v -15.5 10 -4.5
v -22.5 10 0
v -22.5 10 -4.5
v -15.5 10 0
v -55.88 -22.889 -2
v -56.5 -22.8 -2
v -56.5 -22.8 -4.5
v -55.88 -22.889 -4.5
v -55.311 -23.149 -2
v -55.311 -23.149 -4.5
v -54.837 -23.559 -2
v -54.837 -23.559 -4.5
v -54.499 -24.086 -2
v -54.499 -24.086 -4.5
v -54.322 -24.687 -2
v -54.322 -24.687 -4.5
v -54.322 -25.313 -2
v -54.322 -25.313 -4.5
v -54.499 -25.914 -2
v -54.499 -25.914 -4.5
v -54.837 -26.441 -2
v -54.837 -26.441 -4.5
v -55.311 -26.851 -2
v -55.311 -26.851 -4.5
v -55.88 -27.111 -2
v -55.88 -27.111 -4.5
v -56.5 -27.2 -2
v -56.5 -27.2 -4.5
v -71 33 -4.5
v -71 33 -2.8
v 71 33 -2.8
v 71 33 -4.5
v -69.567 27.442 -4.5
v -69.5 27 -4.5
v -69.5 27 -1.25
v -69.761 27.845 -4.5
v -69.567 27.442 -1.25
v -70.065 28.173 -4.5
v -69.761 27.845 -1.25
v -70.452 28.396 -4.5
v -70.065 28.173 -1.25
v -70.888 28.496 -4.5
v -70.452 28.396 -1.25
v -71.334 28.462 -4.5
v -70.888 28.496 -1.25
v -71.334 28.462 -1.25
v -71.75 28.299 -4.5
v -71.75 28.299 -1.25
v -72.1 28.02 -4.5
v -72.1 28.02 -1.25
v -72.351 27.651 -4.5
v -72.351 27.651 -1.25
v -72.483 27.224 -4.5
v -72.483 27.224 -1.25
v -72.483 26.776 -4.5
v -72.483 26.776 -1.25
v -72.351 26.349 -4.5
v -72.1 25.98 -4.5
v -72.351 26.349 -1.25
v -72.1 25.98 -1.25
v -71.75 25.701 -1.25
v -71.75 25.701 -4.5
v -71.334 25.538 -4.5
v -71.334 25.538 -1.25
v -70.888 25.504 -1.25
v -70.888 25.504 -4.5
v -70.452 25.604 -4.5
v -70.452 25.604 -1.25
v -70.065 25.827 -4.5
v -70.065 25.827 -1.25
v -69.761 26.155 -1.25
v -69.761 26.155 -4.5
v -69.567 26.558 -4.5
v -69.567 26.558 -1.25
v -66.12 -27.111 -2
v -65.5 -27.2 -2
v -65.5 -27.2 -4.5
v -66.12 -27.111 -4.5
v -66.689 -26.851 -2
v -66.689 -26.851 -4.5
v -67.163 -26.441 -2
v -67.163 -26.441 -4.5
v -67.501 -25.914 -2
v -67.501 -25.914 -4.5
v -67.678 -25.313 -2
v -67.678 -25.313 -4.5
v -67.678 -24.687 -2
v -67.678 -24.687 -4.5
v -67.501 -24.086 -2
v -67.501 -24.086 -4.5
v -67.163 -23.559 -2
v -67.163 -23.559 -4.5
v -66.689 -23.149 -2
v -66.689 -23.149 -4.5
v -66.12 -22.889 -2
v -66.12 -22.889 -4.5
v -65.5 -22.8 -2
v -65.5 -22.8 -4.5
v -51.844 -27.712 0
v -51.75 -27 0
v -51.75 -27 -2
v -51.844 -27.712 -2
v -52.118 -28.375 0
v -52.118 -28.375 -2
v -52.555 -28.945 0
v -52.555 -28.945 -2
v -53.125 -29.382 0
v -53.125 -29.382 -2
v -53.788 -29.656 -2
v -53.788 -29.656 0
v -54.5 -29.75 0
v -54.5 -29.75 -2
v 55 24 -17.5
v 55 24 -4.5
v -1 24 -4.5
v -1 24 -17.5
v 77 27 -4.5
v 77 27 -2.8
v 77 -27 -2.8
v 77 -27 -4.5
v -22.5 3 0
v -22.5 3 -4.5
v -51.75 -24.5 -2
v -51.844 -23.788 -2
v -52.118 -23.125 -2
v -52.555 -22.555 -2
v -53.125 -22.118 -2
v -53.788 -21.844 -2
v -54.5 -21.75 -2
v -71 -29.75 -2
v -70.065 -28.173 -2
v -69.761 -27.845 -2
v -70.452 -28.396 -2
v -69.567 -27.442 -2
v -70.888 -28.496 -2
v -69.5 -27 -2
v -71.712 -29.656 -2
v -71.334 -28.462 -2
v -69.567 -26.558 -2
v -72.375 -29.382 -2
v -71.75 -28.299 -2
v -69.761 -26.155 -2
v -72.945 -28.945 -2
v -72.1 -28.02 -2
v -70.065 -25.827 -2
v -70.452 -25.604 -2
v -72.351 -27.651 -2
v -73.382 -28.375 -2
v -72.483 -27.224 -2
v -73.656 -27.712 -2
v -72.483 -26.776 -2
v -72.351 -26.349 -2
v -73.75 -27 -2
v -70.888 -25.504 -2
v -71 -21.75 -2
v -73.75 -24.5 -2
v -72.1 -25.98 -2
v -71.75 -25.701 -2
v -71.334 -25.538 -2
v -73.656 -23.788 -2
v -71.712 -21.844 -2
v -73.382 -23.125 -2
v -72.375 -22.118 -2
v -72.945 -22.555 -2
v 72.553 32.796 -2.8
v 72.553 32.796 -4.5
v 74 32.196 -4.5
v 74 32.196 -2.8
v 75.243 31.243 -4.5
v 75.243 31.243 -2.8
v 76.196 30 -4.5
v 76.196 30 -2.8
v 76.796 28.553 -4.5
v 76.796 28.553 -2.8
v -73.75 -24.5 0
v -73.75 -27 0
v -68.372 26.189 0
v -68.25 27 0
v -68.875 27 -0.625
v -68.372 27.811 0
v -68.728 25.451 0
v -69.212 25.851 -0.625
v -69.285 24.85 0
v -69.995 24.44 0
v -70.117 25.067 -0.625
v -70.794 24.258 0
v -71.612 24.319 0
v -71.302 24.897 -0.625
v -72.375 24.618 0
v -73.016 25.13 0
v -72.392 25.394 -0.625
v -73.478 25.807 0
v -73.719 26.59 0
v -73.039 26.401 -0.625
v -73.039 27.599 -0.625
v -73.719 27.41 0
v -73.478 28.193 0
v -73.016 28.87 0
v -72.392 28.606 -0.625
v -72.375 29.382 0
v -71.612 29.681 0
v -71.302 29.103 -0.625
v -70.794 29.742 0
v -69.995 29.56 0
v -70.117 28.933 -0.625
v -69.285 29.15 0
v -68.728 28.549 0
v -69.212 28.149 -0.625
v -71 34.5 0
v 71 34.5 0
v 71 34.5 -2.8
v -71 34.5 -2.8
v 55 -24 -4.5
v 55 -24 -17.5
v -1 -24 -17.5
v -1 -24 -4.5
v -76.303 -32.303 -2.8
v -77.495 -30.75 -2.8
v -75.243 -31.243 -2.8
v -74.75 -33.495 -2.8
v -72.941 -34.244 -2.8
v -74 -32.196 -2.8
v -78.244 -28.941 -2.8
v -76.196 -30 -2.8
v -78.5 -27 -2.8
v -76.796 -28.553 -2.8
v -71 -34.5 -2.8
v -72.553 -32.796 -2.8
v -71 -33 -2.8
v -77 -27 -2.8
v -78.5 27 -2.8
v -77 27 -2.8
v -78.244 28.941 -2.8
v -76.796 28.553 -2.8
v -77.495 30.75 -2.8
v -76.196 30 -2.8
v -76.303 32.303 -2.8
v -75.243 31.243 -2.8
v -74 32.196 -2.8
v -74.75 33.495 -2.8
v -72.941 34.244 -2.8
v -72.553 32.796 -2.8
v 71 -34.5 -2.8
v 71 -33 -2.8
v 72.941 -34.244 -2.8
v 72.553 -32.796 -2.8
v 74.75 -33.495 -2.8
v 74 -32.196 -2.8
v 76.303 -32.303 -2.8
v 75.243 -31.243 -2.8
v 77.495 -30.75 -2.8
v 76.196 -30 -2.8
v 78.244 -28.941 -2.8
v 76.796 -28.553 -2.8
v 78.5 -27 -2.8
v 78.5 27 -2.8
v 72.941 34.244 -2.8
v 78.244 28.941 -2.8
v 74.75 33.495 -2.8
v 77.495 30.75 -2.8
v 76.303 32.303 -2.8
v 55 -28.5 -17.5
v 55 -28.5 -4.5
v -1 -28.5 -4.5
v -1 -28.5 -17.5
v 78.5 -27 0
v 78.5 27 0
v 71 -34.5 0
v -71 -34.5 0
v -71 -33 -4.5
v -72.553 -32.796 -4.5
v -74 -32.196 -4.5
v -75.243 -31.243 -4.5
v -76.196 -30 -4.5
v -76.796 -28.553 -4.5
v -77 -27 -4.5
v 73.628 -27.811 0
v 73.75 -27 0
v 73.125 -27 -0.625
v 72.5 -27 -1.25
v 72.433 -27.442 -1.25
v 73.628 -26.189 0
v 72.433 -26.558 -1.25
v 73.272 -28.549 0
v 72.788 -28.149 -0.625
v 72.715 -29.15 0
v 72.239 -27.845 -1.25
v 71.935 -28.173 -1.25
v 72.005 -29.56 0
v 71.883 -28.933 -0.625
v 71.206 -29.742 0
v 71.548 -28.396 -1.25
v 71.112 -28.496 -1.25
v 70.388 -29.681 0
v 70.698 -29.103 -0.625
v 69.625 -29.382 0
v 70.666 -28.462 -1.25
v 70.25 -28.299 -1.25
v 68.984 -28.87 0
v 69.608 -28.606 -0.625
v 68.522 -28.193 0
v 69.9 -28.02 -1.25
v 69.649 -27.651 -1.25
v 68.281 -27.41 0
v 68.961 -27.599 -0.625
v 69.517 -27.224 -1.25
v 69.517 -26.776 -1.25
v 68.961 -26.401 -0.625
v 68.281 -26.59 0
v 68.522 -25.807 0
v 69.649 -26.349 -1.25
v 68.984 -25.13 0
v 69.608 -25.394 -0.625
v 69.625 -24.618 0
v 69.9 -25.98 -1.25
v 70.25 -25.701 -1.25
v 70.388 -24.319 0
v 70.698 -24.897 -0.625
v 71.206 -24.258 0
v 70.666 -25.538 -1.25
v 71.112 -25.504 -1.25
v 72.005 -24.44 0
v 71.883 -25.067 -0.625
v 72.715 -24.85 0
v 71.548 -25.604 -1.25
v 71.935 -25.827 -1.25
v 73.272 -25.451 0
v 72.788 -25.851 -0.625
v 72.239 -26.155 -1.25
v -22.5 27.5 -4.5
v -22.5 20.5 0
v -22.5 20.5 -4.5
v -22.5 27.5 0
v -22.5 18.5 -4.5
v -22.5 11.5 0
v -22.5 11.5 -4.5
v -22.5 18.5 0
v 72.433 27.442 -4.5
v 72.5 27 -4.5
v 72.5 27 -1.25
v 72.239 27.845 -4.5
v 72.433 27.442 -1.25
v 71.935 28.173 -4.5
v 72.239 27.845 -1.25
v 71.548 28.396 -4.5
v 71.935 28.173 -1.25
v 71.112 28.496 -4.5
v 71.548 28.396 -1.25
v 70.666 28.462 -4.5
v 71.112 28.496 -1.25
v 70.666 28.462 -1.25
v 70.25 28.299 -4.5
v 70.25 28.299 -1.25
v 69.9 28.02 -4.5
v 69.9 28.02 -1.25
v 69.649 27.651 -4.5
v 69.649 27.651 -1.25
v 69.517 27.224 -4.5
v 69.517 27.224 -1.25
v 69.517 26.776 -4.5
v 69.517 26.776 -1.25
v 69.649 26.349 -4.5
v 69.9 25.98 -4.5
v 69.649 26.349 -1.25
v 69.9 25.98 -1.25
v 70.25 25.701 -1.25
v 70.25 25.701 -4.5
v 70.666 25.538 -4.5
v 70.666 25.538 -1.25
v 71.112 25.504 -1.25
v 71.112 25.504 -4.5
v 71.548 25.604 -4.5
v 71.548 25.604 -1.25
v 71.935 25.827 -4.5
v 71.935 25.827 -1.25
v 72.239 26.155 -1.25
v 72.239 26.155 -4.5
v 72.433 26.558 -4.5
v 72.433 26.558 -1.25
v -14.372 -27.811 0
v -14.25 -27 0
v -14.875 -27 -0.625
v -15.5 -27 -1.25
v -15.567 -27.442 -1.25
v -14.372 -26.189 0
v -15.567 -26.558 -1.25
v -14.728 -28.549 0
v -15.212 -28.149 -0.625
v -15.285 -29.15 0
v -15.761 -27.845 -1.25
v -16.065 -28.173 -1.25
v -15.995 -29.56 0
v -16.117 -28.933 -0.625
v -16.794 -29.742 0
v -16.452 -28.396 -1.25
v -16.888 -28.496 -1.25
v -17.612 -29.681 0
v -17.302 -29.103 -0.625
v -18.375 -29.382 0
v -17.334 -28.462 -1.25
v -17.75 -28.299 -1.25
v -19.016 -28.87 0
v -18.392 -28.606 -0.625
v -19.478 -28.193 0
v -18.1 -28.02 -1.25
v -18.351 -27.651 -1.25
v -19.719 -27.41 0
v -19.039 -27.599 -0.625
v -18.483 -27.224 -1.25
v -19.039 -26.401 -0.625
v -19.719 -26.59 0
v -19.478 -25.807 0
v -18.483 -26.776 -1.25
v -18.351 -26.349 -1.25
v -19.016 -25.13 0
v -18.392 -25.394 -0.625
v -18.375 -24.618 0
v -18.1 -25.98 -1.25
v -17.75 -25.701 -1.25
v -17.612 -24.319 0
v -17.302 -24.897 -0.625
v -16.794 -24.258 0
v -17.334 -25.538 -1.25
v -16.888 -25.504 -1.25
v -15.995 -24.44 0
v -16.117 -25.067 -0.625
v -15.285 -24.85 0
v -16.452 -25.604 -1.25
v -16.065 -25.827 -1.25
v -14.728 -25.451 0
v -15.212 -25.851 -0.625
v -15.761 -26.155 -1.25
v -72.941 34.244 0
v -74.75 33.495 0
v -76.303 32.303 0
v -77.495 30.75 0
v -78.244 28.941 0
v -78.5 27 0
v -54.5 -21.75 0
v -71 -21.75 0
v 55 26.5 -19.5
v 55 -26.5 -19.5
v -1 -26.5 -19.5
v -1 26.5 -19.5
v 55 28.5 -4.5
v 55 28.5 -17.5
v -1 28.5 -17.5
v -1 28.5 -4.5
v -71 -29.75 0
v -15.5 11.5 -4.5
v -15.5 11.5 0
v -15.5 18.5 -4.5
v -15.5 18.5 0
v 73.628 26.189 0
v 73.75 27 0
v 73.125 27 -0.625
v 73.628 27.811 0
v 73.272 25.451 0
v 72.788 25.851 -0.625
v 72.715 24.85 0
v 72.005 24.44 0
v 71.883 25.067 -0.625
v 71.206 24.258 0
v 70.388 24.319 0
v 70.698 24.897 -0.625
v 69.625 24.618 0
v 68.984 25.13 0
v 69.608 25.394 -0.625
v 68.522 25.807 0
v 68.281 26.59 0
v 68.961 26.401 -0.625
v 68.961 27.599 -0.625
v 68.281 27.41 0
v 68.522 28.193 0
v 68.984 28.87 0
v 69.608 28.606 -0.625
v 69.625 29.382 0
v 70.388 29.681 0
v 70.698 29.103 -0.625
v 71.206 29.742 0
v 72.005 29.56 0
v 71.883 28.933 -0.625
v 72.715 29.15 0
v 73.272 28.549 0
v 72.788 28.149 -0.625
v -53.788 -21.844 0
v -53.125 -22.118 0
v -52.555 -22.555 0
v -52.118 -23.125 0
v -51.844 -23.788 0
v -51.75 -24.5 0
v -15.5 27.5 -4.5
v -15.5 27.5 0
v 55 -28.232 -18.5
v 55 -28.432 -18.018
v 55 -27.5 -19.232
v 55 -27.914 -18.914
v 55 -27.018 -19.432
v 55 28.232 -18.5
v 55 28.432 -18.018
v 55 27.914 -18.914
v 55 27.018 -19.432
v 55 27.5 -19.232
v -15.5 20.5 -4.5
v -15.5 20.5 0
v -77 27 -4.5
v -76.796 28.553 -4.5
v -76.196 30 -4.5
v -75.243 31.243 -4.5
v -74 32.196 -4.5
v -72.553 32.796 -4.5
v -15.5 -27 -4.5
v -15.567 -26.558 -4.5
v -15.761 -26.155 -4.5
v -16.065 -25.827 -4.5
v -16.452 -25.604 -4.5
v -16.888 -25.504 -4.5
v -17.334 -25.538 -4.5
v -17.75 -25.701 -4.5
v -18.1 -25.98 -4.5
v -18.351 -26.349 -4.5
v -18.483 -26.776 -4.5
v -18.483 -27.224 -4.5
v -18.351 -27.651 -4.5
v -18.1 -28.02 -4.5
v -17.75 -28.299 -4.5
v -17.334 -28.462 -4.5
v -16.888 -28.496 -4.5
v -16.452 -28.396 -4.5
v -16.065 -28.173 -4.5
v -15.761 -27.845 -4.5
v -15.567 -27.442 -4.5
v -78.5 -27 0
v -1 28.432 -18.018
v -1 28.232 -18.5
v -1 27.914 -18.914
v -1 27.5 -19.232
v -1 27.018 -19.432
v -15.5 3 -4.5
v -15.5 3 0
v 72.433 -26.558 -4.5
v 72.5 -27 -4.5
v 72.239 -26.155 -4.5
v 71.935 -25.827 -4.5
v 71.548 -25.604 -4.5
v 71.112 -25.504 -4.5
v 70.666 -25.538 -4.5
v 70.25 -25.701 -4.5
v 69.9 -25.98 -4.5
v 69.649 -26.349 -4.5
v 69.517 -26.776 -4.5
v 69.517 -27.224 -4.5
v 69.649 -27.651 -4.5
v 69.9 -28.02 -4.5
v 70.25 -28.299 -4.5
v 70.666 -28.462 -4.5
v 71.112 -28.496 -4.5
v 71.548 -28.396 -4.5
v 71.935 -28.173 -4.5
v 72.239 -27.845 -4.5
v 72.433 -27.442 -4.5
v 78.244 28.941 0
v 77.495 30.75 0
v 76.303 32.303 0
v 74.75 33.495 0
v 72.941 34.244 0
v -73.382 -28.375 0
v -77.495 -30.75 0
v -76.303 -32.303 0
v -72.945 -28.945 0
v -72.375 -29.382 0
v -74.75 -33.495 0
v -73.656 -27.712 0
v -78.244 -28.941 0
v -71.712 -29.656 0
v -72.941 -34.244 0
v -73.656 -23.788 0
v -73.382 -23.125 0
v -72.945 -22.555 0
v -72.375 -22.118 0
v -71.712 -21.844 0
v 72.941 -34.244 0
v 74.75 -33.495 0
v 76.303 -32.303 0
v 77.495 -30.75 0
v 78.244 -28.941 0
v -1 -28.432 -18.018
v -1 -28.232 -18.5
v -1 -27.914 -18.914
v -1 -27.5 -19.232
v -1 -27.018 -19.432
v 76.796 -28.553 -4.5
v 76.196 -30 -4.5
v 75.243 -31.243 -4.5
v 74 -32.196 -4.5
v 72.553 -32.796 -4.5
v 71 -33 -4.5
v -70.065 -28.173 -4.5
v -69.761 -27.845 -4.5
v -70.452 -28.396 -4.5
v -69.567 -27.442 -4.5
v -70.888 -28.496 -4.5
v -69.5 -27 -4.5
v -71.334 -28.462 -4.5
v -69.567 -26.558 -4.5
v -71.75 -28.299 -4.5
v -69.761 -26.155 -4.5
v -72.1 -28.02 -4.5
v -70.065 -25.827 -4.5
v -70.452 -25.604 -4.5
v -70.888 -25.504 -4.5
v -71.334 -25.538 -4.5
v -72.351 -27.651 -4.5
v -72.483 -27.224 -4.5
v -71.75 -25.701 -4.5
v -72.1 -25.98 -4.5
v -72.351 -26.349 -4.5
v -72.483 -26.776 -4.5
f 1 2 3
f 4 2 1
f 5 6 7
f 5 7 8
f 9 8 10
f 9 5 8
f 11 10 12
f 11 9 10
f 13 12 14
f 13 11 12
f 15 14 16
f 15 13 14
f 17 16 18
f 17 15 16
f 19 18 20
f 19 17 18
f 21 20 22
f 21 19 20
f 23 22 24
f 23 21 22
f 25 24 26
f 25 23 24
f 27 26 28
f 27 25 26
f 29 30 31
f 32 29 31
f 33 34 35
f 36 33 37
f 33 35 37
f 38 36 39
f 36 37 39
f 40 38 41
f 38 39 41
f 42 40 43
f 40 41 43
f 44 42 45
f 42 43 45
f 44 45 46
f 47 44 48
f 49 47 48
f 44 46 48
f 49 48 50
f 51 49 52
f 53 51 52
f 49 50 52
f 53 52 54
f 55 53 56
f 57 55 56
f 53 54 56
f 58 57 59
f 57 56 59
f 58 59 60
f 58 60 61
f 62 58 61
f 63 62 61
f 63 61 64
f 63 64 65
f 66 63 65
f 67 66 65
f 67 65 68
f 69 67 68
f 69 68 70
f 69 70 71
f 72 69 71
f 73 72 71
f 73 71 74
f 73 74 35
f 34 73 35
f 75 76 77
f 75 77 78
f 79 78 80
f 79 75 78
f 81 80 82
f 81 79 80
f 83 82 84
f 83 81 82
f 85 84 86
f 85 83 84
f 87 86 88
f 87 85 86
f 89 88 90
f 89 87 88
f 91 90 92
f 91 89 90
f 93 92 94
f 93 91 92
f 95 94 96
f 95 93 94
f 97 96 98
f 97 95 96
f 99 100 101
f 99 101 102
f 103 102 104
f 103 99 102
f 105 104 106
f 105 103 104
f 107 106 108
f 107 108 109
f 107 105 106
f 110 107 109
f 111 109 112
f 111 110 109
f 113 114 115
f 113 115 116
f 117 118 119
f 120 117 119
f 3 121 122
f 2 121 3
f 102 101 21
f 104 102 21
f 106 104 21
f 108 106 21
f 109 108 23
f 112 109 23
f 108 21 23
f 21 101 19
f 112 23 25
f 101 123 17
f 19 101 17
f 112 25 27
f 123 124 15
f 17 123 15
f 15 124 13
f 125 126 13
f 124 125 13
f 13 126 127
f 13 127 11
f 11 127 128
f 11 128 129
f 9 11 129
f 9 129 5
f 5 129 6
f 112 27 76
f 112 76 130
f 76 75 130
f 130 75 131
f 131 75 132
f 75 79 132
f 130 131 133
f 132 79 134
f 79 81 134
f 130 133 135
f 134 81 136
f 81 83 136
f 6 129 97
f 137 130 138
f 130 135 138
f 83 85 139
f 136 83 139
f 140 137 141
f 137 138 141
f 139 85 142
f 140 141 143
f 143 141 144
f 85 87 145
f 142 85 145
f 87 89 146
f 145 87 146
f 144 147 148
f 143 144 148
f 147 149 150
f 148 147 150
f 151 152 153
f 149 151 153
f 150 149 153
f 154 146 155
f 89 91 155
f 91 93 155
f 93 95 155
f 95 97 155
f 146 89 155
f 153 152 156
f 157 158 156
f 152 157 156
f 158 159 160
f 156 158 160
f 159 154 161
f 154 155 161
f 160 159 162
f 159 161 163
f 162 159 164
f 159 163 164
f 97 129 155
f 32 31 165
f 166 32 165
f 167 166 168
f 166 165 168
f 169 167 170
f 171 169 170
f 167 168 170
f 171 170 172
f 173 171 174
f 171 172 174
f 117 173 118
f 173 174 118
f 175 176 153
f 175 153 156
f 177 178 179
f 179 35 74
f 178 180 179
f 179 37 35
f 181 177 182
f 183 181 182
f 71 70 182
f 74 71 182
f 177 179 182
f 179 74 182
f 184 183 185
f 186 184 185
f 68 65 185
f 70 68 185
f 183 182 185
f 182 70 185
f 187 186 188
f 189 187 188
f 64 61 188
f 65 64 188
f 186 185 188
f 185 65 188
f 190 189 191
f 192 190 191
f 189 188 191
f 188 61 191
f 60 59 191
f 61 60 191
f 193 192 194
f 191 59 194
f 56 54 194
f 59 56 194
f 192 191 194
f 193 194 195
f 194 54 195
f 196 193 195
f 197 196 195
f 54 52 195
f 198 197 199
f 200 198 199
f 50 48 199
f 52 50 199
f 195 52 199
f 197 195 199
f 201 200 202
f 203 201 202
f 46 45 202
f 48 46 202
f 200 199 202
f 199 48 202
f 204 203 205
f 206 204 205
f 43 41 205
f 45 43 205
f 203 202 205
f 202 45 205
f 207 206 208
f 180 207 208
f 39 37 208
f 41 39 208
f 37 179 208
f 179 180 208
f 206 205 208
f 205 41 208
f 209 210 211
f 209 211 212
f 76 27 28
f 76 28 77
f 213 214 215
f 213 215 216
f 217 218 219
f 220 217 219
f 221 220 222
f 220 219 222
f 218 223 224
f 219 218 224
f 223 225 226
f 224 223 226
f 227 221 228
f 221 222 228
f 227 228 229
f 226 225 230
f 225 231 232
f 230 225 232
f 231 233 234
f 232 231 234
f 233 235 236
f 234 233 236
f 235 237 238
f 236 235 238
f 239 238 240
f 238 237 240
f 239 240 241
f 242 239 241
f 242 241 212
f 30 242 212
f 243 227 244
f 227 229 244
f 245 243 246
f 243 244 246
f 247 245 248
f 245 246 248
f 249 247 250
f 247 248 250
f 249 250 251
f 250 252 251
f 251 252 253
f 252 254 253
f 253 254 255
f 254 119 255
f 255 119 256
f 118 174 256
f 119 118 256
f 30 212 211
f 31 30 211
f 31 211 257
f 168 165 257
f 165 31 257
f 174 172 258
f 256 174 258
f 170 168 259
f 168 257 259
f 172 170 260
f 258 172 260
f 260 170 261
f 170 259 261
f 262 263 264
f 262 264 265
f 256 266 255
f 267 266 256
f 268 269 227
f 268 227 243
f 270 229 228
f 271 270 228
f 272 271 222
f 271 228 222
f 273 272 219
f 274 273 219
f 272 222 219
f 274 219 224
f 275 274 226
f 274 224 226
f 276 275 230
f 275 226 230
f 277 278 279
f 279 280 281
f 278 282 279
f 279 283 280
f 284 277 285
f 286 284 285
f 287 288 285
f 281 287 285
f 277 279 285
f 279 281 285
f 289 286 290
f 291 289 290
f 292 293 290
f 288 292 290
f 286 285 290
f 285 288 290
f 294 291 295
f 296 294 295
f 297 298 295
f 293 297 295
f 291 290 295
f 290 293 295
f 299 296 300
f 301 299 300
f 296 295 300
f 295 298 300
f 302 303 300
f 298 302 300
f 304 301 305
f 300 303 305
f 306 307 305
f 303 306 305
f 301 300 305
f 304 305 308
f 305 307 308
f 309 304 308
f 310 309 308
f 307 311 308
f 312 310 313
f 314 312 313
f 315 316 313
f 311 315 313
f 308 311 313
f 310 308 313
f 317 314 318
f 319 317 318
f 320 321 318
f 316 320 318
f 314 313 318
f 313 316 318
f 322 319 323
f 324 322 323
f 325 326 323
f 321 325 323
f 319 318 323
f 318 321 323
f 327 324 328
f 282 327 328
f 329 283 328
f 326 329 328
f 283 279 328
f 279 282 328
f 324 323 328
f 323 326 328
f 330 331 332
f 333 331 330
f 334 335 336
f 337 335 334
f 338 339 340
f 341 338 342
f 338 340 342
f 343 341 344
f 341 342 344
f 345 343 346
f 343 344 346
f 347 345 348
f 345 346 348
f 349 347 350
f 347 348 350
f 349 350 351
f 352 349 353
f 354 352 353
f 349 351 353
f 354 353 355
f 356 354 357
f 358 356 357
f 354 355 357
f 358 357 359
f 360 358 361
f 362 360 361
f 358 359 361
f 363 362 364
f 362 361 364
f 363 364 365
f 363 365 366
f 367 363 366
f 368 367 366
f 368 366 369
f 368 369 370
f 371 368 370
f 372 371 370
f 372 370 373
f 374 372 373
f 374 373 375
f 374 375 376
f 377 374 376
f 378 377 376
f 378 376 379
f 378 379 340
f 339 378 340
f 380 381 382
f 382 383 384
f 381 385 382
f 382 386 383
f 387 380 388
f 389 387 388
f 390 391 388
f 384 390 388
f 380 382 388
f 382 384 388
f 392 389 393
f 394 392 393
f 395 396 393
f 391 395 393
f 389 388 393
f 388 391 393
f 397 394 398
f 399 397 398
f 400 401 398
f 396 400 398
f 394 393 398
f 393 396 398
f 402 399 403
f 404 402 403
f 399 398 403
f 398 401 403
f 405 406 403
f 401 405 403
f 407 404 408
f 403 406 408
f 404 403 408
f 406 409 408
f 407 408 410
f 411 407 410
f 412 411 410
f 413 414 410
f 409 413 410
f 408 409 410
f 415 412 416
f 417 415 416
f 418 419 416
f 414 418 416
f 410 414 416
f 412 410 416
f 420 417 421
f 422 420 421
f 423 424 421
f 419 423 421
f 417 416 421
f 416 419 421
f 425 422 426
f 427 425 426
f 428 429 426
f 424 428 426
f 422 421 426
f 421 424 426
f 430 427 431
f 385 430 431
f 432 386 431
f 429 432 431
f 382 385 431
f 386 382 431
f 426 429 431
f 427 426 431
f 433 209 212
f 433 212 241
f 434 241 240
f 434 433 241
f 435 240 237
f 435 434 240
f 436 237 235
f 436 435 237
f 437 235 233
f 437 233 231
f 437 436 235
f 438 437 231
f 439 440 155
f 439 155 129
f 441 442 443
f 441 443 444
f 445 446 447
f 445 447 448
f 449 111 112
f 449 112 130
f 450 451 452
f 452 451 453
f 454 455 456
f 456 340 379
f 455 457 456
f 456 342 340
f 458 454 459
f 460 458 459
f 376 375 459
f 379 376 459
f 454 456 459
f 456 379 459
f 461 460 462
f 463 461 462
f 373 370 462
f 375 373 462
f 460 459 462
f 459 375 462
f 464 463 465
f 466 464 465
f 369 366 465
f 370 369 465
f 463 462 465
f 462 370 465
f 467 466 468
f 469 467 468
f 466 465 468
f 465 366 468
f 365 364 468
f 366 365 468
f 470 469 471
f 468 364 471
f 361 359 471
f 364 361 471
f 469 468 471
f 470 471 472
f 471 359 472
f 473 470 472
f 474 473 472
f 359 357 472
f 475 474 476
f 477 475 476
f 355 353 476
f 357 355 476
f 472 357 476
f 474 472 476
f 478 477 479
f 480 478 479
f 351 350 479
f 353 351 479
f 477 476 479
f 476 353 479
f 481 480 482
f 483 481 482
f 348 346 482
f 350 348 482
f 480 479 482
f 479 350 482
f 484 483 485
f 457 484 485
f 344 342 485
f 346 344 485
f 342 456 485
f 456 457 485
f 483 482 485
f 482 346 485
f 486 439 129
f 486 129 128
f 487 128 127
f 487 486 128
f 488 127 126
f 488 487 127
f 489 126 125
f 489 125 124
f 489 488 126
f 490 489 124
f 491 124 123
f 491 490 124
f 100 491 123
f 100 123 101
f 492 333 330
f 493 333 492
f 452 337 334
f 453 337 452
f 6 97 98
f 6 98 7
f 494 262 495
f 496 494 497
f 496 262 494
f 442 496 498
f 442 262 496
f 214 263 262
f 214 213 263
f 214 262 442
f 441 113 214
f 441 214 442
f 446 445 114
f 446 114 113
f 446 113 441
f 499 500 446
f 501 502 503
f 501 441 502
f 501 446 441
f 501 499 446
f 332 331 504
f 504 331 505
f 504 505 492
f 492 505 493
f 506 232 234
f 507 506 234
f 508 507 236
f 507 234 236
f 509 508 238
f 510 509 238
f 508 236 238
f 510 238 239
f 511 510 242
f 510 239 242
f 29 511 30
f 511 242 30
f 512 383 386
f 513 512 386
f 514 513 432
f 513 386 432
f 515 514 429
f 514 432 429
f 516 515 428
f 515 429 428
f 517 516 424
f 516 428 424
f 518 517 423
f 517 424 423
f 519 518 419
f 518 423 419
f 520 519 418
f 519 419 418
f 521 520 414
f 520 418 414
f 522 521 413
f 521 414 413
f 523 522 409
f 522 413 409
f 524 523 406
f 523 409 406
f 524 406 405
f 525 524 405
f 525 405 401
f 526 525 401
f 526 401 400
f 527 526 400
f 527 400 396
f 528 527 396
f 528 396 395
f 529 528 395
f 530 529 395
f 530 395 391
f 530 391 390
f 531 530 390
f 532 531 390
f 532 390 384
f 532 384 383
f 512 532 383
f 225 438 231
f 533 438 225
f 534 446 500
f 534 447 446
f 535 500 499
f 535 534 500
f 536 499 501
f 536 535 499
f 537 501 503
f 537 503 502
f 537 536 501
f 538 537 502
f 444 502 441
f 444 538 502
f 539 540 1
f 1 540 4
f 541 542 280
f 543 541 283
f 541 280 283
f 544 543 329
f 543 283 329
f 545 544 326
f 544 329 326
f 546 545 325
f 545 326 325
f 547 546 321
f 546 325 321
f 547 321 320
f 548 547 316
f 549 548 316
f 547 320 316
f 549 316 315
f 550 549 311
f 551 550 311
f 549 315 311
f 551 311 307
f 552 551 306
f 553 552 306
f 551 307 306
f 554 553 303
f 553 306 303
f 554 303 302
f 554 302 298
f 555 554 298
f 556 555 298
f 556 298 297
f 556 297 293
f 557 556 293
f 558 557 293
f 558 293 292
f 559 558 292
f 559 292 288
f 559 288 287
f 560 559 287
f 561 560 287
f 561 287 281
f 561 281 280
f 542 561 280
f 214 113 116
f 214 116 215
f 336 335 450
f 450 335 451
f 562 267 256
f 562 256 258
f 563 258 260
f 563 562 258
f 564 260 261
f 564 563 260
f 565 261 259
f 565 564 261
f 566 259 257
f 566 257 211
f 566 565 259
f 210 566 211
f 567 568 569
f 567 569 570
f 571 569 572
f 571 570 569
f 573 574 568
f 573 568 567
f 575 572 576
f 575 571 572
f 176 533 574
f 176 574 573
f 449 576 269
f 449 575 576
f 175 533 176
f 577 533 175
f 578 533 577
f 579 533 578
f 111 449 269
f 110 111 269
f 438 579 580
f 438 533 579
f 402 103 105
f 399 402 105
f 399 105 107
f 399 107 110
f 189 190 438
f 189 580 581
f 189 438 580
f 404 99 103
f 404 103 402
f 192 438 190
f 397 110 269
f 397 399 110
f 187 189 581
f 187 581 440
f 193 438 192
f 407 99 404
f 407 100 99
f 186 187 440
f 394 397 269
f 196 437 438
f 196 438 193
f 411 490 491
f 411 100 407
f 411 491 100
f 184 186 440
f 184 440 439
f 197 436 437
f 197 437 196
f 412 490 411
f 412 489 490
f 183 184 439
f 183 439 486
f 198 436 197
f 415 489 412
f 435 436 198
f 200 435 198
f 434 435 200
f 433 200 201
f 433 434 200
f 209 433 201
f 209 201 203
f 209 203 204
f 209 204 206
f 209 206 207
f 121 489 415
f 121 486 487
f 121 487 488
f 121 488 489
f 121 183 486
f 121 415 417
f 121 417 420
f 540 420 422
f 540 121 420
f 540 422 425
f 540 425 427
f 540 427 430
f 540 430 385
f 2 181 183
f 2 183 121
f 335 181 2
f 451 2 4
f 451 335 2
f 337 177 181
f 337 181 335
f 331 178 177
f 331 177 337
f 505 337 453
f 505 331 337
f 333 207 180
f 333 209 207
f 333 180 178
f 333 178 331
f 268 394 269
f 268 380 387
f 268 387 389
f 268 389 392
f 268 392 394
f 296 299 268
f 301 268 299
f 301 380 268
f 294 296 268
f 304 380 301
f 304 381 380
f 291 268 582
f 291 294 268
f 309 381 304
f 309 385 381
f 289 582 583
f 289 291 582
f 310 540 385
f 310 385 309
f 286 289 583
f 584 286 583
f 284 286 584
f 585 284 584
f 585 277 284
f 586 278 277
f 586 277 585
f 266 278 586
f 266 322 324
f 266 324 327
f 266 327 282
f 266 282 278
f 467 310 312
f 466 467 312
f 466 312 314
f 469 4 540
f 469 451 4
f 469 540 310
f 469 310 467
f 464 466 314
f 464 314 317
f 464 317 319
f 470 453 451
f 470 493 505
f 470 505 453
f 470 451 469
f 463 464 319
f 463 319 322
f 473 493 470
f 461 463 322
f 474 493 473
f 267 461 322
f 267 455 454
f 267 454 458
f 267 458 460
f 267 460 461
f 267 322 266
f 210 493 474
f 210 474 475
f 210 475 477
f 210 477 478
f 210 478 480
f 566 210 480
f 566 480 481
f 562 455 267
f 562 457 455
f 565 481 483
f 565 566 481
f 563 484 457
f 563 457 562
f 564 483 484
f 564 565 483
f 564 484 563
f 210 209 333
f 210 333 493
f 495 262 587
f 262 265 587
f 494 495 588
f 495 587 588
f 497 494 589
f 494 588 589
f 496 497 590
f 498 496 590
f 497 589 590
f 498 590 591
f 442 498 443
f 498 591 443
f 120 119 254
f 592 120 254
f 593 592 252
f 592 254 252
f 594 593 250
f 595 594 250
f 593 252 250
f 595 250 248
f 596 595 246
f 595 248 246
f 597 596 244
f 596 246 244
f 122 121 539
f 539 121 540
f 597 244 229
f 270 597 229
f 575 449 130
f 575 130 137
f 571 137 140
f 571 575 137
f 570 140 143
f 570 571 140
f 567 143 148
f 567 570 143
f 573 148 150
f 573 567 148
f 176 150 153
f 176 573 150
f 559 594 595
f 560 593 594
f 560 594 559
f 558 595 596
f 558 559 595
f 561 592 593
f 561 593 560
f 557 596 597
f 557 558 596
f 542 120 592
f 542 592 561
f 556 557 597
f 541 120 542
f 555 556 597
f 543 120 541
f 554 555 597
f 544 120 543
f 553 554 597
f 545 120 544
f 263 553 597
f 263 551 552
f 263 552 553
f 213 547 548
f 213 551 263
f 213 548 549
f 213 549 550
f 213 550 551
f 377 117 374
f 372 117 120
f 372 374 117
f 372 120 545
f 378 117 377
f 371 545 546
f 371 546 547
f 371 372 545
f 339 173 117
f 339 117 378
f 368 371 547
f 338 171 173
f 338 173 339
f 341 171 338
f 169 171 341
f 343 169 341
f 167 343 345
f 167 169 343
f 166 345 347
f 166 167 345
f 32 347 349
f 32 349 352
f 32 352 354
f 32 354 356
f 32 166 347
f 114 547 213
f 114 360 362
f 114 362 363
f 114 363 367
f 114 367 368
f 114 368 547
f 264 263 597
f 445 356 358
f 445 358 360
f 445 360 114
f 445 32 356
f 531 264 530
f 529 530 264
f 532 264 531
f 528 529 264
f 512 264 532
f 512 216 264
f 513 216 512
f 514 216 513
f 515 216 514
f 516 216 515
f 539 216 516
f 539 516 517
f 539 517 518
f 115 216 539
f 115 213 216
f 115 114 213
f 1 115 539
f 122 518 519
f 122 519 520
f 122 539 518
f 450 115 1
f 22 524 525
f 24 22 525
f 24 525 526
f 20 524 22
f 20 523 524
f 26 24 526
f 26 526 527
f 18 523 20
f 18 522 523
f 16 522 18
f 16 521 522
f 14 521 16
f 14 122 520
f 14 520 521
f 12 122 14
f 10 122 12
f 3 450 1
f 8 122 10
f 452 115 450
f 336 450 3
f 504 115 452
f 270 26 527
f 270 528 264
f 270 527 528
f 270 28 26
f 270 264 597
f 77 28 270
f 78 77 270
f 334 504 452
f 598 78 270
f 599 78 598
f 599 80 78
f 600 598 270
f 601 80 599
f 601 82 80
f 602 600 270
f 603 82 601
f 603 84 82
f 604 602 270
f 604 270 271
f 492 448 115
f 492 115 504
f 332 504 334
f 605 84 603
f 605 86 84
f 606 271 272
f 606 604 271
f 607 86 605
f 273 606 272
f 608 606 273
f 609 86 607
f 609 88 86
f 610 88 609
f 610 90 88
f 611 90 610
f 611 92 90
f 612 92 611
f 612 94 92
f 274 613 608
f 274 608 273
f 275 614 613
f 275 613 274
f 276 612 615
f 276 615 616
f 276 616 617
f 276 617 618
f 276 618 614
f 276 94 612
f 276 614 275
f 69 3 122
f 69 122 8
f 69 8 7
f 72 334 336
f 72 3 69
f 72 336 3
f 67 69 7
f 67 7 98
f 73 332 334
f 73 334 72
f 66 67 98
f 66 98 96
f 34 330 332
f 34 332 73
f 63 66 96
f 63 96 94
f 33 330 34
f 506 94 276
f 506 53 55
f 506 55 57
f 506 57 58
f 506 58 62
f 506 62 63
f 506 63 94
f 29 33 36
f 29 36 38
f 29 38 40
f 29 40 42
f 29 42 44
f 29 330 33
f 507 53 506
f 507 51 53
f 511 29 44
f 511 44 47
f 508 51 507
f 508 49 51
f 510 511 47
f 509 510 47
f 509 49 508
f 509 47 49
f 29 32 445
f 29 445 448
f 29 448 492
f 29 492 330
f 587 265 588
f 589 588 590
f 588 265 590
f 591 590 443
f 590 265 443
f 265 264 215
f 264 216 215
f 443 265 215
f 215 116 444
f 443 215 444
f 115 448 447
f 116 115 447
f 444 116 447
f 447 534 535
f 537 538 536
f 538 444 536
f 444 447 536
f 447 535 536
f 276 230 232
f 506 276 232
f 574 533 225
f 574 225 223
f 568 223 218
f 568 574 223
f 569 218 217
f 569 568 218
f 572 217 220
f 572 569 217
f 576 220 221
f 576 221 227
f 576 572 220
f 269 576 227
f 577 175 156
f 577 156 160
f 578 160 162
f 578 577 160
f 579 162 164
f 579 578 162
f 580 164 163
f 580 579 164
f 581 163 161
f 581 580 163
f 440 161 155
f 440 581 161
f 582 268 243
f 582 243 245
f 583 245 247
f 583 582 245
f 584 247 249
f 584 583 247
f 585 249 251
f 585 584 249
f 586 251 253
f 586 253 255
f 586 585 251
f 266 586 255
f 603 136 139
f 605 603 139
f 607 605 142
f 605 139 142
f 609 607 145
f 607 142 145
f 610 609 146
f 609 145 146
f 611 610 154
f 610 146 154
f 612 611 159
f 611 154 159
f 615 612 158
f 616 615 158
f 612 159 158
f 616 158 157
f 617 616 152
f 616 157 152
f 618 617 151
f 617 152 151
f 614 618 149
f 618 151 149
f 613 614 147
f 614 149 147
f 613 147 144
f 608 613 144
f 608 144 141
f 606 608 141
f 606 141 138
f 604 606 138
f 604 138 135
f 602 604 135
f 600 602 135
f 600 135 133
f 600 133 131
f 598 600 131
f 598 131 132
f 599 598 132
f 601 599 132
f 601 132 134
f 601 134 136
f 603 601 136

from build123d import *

# Parameters (mm, degrees)
EXTRUDE_1_DEPTH             = 2.8
EXTRUDE_2_DEPTH             = 4.5
SKETCH_2_R                  = 1.5
CUT_EXTRUDE_1_DEPTH         = 5
PATTERN_LINEAR_1_COUNT      = 2
PATTERN_LINEAR_1_PITCH      = 142
PATTERN_LINEAR_1_COUNT_DIR2 = 2
PATTERN_LINEAR_1_PITCH_DIR2 = 54
CUT_EXTRUDE_2_DEPTH         = 2
SKETCH_7_R                  = 1.5
CUT_EXTRUDE_3_DEPTH         = 3
SKETCH_8_W                  = 7
SKETCH_8_H                  = 7
CUT_EXTRUDE_4_DEPTH         = 5
EXTRUDE_3_DEPTH             = 56
FILLET_1_R                  = 2


with BuildPart() as part:
    # 草图1 → 凸台-拉伸1 (new body)
    with BuildSketch(Plane.XY):
        with BuildLine():
            Line((-71, -34.5), (71, -34.5))
            ThreePointArc((71, -34.5), (76.303300859, -32.303300859), (78.5, -27))
            Line((78.5, -27), (78.5, 27))
            ThreePointArc((78.5, 27), (76.303300859, 32.303300859), (71, 34.5))
            Line((71, 34.5), (-71, 34.5))
            ThreePointArc((-71, 34.5), (-76.303300859, 32.303300859), (-78.5, 27))
            Line((-78.5, 27), (-78.5, -27))
            ThreePointArc((-78.5, -27), (-76.303300859, -32.303300859), (-71, -34.5))
        make_face()
        with BuildLine():
            Line((-71, -33), (71, -33))
            ThreePointArc((71, -33), (75.242640687, -31.242640687), (77, -27))
            Line((77, -27), (77, 27))
            ThreePointArc((77, 27), (75.242640687, 31.242640687), (71, 33))
            Line((71, 33), (-71, 33))
            ThreePointArc((-71, 33), (-75.242640687, 31.242640687), (-77, 27))
            Line((-77, 27), (-77, -27))
            ThreePointArc((-77, -27), (-75.242640687, -31.242640687), (-71, -33))
        make_face(mode=Mode.SUBTRACT)
    extrude(amount=-EXTRUDE_1_DEPTH)

    # 草图1<2> → 凸台-拉伸2 (add)
    with BuildSketch(Plane.XY):
        with BuildLine():
            ThreePointArc((-77, -27), (-75.242640687, -31.242640687), (-71, -33))
            Line((-71, -33), (71, -33))
            ThreePointArc((71, -33), (75.242640687, -31.242640687), (77, -27))
            Line((77, -27), (77, 27))
            ThreePointArc((77, 27), (75.242640687, 31.242640687), (71, 33))
            Line((71, 33), (-71, 33))
            ThreePointArc((-71, 33), (-75.242640687, 31.242640687), (-77, 27))
            Line((-77, 27), (-77, -27))
        make_face()
    extrude(amount=-EXTRUDE_2_DEPTH)

    # 草图2 → 切除-拉伸1 (cut)
    with BuildSketch(Plane.XY):
        with Locations((-71, 27)):
            Circle(SKETCH_2_R)
        with Locations((-71, -27)):
            Circle(SKETCH_2_R)
        with Locations((71, 27)):
            Circle(SKETCH_2_R)
        with Locations((71, -27)):
            Circle(SKETCH_2_R)
        with Locations((-17, -27)):
            Circle(SKETCH_2_R)
    extrude(amount=-CUT_EXTRUDE_1_DEPTH, mode=Mode.SUBTRACT)

    # 草图4 → 切除-旋转1 (revolve, cut)
    with BuildSketch(Plane(origin=(-71, 0, 0), x_dir=(0, 0, -1), z_dir=(1, 0, 0))):
        Polygon((2.75, 27), (0, 27), (0, 29.75), align=None)
    cut_revolve_1 = revolve(axis=Axis((-71, 27, 0.2), (0, 0, -1)), mode=Mode.SUBTRACT)

    # 阵列(线性)1: Cut-Revolve 1 2 × 2
    with Locations(*[(i * PATTERN_LINEAR_1_PITCH, -j * PATTERN_LINEAR_1_PITCH_DIR2, 0) for i in range(PATTERN_LINEAR_1_COUNT) for j in range(PATTERN_LINEAR_1_COUNT_DIR2) if (i, j) != (0, 0)]):
        add(cut_revolve_1, mode=Mode.SUBTRACT)

    # 草图5 → 切除-旋转2 (revolve, cut)
    with BuildSketch(Plane(origin=(-17, 0, 0), x_dir=(0, 0, -1), z_dir=(1, 0, 0))):
        Polygon((2.75, -27), (0, -27), (0, -24.25), align=None)
    revolve(axis=Axis((-17, -27, 0.2), (0, 0, -1)), mode=Mode.SUBTRACT)

    # 草图6 → 切除-拉伸2 (cut)
    with BuildSketch(Plane.XY):
        with BuildLine():
            Line((-71, -21.75), (-54.5, -21.75))
            ThreePointArc((-54.5, -21.75), (-52.555456352, -22.555456352), (-51.75, -24.5))
            Line((-51.75, -24.5), (-51.75, -27))
            ThreePointArc((-51.75, -27), (-52.555456352, -28.944543648), (-54.5, -29.75))
            Line((-54.5, -29.75), (-71, -29.75))
            ThreePointArc((-71, -29.75), (-72.944543648, -28.944543648), (-73.75, -27))
            Line((-73.75, -27), (-73.75, -24.5))
            ThreePointArc((-73.75, -24.5), (-72.944543648, -22.555456352), (-71, -21.75))
        make_face()
    extrude(amount=-CUT_EXTRUDE_2_DEPTH, mode=Mode.SUBTRACT)

    # 草图7 → 切除-拉伸3 (cut)
    with BuildSketch(Plane.XY.offset(-2)):
        with Locations((-71, -27)):
            Circle(SKETCH_7_R)
        with BuildLine():
            Line((-65.5, -22.8), (-56.5, -22.8))
            ThreePointArc((-56.5, -22.8), (-54.3, -25), (-56.5, -27.2))
            Line((-56.5, -27.2), (-65.5, -27.2))
            ThreePointArc((-65.5, -27.2), (-67.7, -25), (-65.5, -22.8))
        make_face()
    extrude(amount=-CUT_EXTRUDE_3_DEPTH, mode=Mode.SUBTRACT)

    # 草图8 → 切除-拉伸4 (cut)
    with BuildSketch(Plane.XY):
        with Locations((-19, 24)):
            Rectangle(SKETCH_8_W, SKETCH_8_H)
        with Locations((-19, 15)):
            Rectangle(SKETCH_8_W, SKETCH_8_H)
        with Locations((-19, 6.5)):
            Rectangle(SKETCH_8_W, SKETCH_8_H)
    extrude(amount=-CUT_EXTRUDE_4_DEPTH, mode=Mode.SUBTRACT)

    # 草图9 → 凸台-拉伸3 (add)
    with BuildSketch(Plane(origin=(55, 0, 0), x_dir=(0, 0, -1), z_dir=(1, 0, 0))):
        Polygon((17.5, -24), (4.5, -24), (4.5, -28.5), (19.5, -28.5), (19.5, 28.5), (4.5, 28.5), (4.5, 24), (17.5, 24), align=None)
    extrude(amount=-EXTRUDE_3_DEPTH)

    # 圆角1
    fillet_1_edges = [part.edges().sort_by_distance(p)[0] for p in [
        (27, -28.5, -19.5),
        (27, 28.5, -19.5),
    ]]
    fillet(fillet_1_edges, radius=FILLET_1_R)


solid = part.part
